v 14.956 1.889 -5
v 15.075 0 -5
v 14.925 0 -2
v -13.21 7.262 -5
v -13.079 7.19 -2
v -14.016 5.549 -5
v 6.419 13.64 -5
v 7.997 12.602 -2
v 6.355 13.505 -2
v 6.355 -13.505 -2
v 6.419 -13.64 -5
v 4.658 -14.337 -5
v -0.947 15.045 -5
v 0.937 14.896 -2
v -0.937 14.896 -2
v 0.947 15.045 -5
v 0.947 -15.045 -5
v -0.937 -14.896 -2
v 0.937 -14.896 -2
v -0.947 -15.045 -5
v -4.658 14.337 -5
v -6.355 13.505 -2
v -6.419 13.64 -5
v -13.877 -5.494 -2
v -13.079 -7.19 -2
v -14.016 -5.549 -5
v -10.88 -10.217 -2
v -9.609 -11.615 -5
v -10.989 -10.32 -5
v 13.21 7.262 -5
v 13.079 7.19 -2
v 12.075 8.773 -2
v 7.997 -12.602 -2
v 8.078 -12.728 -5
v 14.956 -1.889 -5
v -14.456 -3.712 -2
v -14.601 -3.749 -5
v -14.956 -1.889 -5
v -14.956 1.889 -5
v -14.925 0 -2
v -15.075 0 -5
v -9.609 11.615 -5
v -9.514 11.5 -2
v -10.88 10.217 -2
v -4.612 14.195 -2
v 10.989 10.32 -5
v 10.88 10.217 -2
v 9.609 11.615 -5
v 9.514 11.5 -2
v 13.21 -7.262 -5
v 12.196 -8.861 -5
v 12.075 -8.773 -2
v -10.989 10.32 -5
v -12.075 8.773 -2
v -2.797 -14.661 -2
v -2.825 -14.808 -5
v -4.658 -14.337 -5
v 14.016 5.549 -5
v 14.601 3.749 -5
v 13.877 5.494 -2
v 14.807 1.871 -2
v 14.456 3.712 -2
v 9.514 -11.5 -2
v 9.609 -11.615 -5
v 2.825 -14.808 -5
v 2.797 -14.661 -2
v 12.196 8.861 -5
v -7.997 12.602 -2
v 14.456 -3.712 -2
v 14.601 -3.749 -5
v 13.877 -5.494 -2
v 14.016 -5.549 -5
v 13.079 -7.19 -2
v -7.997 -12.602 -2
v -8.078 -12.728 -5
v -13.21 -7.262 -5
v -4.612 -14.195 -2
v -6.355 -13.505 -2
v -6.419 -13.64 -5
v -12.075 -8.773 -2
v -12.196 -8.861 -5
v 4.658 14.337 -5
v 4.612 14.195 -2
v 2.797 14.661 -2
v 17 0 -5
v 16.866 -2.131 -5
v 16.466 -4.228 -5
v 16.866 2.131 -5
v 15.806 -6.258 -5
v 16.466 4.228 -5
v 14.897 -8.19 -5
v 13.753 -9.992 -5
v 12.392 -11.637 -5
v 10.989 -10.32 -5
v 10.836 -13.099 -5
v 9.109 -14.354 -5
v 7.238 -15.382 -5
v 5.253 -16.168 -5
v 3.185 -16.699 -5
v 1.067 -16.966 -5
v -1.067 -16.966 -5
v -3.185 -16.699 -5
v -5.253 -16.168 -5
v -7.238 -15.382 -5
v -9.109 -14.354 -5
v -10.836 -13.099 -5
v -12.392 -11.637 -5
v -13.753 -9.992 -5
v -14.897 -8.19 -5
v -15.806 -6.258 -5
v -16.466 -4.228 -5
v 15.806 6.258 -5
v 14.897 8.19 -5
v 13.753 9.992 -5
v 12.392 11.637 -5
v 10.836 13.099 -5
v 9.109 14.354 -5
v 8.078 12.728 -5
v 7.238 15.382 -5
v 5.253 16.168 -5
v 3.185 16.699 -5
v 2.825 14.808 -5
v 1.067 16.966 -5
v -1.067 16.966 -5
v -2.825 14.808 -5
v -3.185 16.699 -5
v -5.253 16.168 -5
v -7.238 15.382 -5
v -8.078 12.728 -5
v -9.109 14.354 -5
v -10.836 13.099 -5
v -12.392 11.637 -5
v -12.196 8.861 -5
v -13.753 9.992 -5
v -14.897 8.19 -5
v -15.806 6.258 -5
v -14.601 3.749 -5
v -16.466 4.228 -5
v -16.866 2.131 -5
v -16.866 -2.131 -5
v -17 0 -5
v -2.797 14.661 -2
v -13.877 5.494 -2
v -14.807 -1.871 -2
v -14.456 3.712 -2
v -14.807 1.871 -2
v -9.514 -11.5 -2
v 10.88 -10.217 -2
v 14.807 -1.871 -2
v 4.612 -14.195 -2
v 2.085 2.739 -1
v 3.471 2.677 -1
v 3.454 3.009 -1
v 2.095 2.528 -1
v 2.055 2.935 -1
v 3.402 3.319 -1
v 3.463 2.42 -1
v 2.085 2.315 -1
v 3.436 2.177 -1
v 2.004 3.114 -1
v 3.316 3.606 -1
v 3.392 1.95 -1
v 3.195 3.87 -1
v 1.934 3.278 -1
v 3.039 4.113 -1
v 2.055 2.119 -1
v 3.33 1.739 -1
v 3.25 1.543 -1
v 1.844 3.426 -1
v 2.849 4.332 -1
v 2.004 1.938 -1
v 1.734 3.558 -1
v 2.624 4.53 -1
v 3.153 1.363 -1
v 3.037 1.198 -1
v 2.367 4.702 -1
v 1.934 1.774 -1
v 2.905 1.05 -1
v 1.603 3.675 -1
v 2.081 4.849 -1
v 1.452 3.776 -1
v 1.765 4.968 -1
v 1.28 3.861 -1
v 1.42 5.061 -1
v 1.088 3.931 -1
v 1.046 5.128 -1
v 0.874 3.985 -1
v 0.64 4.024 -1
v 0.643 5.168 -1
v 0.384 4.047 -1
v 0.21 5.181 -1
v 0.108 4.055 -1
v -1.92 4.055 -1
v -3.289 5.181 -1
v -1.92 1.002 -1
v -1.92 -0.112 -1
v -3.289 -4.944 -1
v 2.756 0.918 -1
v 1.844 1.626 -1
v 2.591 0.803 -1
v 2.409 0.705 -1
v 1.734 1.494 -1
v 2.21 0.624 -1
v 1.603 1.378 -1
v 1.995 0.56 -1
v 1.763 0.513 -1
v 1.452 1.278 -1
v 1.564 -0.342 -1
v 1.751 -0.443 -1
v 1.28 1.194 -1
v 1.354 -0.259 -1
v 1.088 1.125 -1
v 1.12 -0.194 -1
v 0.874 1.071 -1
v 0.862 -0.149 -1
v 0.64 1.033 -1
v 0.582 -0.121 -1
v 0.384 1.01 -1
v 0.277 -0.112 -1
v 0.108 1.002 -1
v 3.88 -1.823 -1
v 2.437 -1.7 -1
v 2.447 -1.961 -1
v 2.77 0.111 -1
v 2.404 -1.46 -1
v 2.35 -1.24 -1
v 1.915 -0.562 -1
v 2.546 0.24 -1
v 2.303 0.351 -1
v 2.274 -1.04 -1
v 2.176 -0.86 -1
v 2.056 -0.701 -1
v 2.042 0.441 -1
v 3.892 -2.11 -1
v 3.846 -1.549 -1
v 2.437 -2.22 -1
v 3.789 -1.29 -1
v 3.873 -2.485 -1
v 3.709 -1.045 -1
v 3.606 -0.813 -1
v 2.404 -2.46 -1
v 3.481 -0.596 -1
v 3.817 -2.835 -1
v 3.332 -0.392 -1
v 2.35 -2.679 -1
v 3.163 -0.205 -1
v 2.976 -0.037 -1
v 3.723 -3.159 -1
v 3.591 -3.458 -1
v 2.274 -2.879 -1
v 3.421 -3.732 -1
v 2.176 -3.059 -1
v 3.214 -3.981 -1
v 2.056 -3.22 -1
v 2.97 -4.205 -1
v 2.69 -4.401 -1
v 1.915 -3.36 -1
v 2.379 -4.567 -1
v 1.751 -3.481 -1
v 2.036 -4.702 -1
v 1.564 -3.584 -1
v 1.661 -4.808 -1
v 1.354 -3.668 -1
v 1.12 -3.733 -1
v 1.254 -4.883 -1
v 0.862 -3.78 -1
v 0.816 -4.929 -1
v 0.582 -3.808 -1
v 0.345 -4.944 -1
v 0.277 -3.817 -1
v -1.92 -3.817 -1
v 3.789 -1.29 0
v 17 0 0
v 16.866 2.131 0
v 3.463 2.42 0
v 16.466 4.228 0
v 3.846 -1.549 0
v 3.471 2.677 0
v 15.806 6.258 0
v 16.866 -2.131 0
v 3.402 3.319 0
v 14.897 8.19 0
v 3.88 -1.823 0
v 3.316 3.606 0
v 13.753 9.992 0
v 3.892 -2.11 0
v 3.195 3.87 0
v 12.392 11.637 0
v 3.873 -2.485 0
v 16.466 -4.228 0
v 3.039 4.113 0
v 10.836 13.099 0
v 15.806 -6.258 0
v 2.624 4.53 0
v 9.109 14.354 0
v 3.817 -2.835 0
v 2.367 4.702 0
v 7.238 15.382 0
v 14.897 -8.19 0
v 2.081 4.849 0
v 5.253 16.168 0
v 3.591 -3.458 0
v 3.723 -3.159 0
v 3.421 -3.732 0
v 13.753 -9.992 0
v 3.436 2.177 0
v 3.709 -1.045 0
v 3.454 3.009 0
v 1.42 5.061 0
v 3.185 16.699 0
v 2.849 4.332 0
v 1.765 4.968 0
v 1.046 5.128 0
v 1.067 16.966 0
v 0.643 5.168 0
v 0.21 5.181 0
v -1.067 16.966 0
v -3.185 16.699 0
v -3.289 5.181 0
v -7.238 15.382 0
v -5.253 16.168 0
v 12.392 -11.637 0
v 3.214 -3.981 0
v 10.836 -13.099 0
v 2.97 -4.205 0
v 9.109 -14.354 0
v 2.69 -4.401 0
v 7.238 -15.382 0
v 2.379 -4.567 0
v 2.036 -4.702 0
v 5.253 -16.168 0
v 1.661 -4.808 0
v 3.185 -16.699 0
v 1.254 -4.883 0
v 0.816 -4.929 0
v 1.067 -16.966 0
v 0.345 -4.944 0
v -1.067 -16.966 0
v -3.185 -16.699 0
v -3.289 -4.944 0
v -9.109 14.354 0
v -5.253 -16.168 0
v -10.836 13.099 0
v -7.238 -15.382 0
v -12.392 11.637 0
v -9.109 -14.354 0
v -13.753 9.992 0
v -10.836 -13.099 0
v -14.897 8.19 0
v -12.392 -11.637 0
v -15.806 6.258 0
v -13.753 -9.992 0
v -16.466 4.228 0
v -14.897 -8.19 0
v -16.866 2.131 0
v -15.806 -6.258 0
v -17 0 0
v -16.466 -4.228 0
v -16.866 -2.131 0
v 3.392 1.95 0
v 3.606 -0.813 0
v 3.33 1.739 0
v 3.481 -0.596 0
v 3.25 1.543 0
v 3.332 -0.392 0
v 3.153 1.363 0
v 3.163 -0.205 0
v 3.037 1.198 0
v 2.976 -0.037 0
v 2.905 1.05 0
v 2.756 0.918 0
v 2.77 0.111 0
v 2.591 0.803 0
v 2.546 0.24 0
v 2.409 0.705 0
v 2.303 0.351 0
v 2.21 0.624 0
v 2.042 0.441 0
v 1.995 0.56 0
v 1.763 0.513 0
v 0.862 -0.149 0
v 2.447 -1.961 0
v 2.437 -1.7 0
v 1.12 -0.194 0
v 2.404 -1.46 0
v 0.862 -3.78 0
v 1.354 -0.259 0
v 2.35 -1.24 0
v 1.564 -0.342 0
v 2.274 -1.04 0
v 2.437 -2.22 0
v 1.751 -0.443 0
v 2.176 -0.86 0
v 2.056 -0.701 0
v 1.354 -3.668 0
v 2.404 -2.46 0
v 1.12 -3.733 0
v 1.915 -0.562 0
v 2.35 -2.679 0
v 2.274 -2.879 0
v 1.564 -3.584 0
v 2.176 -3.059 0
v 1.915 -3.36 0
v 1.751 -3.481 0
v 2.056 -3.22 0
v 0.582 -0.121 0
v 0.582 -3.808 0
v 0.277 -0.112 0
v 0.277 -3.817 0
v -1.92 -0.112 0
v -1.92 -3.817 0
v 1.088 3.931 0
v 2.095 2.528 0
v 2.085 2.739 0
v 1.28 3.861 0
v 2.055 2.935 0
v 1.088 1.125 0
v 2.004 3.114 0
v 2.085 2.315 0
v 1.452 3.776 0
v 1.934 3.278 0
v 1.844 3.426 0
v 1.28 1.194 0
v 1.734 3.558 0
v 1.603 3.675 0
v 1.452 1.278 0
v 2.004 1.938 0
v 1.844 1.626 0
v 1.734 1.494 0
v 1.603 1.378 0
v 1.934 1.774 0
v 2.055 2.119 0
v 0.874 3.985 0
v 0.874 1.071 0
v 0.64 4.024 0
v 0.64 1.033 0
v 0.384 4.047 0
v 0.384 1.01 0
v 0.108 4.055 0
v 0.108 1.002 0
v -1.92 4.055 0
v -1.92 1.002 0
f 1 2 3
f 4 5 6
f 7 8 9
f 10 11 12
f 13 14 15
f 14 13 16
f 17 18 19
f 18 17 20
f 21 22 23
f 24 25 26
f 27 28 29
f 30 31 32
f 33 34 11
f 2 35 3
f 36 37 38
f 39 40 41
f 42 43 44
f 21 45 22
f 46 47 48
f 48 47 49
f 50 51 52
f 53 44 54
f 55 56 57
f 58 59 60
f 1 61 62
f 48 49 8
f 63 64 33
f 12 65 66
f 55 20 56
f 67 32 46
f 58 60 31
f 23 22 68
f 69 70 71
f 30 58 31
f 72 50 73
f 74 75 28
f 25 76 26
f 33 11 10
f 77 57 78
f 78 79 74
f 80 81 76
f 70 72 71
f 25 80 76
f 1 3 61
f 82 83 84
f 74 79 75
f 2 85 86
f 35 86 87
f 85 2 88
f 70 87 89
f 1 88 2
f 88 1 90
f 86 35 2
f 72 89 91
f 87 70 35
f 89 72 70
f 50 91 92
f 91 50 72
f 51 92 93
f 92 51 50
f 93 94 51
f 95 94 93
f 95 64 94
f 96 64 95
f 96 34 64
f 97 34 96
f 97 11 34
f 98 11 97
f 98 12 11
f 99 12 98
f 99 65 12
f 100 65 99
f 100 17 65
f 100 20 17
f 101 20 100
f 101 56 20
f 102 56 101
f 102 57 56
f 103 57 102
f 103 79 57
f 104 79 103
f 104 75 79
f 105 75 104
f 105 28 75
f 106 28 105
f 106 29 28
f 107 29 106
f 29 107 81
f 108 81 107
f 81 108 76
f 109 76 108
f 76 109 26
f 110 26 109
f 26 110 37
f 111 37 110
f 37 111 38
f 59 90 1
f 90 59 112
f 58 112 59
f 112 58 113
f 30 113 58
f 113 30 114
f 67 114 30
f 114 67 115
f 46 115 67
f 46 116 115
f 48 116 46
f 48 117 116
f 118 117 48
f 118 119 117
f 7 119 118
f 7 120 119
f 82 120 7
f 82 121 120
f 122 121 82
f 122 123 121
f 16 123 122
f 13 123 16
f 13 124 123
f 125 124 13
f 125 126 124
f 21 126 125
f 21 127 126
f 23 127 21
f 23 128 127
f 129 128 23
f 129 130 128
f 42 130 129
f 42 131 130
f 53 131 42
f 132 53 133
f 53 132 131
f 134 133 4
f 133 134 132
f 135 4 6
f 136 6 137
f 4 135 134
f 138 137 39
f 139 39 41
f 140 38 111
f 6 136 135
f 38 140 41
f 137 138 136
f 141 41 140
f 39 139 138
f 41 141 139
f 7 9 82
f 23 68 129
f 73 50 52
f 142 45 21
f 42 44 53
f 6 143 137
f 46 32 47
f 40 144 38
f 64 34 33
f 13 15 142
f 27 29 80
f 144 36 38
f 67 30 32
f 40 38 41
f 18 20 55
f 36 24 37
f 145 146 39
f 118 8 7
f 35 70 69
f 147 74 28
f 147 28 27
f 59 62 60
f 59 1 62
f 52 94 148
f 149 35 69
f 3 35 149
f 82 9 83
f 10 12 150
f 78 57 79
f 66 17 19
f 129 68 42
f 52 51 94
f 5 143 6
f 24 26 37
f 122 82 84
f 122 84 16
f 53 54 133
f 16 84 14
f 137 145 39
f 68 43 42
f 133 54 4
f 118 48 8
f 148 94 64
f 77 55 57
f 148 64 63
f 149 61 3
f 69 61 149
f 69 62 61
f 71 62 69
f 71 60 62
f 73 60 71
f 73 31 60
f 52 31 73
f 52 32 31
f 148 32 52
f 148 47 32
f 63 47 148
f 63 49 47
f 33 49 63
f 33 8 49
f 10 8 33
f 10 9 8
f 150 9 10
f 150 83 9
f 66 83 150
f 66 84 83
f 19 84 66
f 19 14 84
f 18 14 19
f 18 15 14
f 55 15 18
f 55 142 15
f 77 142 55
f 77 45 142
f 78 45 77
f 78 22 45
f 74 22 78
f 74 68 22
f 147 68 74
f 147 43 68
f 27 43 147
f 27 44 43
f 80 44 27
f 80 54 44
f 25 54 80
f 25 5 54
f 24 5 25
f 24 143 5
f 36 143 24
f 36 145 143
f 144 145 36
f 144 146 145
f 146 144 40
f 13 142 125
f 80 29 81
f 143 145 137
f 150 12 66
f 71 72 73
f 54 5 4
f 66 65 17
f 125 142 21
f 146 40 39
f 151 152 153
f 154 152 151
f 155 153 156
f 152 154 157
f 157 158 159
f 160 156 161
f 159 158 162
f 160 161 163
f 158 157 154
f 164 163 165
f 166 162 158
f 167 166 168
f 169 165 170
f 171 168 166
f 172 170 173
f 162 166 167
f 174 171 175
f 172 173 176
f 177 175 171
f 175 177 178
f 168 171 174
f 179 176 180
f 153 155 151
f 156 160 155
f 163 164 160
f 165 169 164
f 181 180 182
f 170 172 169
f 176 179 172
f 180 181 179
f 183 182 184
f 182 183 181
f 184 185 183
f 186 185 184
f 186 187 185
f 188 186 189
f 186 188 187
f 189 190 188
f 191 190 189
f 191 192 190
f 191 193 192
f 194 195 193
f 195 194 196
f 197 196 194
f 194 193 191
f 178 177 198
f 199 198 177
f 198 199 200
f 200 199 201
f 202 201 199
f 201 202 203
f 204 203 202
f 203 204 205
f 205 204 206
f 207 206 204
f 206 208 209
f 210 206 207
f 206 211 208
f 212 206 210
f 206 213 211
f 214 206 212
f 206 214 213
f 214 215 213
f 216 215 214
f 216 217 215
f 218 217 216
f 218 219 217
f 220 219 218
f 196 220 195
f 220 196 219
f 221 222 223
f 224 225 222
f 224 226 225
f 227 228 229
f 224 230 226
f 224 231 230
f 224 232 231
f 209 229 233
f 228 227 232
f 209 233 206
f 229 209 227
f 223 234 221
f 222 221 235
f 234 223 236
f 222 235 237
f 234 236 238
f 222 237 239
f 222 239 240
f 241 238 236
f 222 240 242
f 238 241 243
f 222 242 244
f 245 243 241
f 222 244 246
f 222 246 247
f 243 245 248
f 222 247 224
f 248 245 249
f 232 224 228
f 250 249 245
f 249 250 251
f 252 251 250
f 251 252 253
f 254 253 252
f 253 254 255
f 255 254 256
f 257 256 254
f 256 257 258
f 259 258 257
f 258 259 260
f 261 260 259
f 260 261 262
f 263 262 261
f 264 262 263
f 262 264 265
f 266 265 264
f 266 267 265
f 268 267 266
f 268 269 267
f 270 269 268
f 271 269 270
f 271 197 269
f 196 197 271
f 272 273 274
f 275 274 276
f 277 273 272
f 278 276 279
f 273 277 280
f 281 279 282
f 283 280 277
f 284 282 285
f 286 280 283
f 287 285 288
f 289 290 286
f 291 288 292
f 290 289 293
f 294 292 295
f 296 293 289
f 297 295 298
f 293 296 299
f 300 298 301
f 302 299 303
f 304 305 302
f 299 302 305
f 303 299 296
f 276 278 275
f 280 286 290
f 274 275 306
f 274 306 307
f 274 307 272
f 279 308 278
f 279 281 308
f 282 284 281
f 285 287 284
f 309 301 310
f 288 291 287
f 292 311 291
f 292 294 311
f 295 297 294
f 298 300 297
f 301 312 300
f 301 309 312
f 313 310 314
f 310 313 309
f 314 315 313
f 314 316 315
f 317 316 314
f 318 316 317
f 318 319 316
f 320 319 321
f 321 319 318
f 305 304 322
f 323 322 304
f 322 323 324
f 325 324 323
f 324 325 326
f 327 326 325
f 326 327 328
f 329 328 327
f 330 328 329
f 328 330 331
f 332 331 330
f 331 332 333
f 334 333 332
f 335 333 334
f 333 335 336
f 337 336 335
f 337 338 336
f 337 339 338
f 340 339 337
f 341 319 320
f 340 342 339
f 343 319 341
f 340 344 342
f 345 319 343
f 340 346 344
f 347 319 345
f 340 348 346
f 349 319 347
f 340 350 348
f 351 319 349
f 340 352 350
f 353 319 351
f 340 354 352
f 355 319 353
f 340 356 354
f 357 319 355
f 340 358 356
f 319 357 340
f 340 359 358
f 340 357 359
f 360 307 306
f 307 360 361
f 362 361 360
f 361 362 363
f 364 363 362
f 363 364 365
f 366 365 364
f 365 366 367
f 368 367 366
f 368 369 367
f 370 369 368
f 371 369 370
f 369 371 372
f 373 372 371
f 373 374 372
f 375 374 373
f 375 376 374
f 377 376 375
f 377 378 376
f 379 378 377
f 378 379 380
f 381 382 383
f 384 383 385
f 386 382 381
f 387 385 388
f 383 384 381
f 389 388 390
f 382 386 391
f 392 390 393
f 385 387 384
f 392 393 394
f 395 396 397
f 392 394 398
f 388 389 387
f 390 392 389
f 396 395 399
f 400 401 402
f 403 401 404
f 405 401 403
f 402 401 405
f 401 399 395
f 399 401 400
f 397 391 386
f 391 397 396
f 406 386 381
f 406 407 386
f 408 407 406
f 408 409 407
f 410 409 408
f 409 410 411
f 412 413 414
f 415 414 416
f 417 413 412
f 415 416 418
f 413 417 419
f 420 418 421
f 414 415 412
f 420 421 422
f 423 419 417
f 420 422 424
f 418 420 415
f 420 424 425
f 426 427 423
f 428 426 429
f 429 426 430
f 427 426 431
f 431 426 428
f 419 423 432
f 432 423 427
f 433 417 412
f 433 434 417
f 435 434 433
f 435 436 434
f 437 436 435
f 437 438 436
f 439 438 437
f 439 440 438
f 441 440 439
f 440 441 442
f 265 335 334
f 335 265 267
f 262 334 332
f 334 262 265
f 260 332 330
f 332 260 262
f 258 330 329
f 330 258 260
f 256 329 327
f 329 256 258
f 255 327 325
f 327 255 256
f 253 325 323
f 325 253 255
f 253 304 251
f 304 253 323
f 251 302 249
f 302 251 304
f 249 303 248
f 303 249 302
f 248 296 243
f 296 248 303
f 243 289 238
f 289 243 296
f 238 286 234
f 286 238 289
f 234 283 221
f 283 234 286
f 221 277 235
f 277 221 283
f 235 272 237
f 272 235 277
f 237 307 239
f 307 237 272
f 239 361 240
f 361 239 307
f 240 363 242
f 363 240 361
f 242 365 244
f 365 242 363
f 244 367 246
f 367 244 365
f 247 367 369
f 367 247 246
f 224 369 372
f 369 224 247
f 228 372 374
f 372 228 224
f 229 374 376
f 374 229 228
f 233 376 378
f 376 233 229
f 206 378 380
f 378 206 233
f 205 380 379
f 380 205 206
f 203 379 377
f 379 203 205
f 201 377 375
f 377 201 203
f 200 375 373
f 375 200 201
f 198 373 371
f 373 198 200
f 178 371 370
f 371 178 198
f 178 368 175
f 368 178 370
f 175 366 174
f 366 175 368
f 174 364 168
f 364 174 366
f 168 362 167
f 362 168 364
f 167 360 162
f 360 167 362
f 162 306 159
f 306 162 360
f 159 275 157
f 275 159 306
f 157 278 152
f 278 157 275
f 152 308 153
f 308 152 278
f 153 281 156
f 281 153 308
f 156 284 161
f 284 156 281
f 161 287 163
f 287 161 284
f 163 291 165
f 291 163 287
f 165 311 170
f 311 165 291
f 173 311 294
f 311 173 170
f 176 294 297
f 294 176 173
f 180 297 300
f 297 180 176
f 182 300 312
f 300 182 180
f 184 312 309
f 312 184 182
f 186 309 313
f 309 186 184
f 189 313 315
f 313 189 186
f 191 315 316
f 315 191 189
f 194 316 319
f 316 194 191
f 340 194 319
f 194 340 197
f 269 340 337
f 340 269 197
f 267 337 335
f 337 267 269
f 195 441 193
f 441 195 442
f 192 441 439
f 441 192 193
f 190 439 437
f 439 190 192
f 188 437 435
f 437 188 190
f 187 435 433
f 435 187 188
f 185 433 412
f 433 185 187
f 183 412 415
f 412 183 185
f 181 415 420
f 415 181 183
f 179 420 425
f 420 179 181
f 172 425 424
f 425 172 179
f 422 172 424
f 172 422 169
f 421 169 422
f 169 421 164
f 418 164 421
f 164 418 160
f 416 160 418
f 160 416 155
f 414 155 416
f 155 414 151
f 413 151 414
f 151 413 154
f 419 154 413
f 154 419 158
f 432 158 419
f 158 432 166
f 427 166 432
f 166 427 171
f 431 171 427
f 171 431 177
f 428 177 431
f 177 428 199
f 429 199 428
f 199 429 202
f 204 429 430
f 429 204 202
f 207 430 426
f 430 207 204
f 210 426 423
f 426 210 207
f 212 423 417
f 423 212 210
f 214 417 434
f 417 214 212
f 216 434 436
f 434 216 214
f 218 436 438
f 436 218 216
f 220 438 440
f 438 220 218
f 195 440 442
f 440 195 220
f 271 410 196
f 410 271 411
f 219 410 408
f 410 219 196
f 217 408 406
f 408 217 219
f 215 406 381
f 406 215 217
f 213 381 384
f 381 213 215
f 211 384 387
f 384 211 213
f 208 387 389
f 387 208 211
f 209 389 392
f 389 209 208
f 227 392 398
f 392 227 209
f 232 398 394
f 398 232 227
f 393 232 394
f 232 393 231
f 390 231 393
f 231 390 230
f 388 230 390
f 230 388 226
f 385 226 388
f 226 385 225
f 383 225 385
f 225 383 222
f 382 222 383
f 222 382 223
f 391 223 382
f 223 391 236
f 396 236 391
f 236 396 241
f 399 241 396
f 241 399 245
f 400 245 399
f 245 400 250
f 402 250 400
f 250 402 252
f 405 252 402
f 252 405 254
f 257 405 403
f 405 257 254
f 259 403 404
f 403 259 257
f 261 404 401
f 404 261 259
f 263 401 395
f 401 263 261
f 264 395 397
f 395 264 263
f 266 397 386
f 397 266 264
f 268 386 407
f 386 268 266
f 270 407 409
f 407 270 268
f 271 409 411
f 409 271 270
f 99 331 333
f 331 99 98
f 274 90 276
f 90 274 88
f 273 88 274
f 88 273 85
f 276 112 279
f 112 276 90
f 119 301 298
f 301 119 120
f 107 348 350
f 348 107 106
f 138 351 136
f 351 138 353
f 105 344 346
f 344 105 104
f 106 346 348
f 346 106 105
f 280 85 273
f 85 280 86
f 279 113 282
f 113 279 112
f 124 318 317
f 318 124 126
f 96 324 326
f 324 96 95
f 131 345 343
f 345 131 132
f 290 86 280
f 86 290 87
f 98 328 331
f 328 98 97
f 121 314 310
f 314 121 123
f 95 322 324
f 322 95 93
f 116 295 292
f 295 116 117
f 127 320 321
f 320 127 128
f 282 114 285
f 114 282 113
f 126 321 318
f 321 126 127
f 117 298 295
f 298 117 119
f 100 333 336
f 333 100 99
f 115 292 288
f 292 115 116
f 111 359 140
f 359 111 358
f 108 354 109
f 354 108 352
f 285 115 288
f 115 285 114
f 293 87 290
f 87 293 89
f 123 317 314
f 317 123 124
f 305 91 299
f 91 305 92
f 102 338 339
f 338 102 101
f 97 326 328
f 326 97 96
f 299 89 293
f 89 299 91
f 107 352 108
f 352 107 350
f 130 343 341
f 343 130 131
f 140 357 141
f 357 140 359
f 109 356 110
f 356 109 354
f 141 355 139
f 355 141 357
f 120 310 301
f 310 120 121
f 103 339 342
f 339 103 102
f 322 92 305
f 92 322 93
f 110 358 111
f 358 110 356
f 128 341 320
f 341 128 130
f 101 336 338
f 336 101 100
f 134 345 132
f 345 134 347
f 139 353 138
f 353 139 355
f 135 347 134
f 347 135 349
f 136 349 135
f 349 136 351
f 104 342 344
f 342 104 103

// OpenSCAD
$fn = 50;

difference() {
	union() {
		translate(v = [0, 0, -5.0]) {
			cylinder(h = 5, r = 17.0);
		}
	}
	union() {
		#translate(v = [0, 0, -5.0]) {
			cylinder(h = 3, r1 = 15.075, r2 = 14.925);
		}
		translate(v = [0, 0, -1]) {
			linear_extrude(height = 1) {
				text(font = "Impact", halign = "center", size = 10, text = "B", valign = "center");
			}
		}
	}
}
